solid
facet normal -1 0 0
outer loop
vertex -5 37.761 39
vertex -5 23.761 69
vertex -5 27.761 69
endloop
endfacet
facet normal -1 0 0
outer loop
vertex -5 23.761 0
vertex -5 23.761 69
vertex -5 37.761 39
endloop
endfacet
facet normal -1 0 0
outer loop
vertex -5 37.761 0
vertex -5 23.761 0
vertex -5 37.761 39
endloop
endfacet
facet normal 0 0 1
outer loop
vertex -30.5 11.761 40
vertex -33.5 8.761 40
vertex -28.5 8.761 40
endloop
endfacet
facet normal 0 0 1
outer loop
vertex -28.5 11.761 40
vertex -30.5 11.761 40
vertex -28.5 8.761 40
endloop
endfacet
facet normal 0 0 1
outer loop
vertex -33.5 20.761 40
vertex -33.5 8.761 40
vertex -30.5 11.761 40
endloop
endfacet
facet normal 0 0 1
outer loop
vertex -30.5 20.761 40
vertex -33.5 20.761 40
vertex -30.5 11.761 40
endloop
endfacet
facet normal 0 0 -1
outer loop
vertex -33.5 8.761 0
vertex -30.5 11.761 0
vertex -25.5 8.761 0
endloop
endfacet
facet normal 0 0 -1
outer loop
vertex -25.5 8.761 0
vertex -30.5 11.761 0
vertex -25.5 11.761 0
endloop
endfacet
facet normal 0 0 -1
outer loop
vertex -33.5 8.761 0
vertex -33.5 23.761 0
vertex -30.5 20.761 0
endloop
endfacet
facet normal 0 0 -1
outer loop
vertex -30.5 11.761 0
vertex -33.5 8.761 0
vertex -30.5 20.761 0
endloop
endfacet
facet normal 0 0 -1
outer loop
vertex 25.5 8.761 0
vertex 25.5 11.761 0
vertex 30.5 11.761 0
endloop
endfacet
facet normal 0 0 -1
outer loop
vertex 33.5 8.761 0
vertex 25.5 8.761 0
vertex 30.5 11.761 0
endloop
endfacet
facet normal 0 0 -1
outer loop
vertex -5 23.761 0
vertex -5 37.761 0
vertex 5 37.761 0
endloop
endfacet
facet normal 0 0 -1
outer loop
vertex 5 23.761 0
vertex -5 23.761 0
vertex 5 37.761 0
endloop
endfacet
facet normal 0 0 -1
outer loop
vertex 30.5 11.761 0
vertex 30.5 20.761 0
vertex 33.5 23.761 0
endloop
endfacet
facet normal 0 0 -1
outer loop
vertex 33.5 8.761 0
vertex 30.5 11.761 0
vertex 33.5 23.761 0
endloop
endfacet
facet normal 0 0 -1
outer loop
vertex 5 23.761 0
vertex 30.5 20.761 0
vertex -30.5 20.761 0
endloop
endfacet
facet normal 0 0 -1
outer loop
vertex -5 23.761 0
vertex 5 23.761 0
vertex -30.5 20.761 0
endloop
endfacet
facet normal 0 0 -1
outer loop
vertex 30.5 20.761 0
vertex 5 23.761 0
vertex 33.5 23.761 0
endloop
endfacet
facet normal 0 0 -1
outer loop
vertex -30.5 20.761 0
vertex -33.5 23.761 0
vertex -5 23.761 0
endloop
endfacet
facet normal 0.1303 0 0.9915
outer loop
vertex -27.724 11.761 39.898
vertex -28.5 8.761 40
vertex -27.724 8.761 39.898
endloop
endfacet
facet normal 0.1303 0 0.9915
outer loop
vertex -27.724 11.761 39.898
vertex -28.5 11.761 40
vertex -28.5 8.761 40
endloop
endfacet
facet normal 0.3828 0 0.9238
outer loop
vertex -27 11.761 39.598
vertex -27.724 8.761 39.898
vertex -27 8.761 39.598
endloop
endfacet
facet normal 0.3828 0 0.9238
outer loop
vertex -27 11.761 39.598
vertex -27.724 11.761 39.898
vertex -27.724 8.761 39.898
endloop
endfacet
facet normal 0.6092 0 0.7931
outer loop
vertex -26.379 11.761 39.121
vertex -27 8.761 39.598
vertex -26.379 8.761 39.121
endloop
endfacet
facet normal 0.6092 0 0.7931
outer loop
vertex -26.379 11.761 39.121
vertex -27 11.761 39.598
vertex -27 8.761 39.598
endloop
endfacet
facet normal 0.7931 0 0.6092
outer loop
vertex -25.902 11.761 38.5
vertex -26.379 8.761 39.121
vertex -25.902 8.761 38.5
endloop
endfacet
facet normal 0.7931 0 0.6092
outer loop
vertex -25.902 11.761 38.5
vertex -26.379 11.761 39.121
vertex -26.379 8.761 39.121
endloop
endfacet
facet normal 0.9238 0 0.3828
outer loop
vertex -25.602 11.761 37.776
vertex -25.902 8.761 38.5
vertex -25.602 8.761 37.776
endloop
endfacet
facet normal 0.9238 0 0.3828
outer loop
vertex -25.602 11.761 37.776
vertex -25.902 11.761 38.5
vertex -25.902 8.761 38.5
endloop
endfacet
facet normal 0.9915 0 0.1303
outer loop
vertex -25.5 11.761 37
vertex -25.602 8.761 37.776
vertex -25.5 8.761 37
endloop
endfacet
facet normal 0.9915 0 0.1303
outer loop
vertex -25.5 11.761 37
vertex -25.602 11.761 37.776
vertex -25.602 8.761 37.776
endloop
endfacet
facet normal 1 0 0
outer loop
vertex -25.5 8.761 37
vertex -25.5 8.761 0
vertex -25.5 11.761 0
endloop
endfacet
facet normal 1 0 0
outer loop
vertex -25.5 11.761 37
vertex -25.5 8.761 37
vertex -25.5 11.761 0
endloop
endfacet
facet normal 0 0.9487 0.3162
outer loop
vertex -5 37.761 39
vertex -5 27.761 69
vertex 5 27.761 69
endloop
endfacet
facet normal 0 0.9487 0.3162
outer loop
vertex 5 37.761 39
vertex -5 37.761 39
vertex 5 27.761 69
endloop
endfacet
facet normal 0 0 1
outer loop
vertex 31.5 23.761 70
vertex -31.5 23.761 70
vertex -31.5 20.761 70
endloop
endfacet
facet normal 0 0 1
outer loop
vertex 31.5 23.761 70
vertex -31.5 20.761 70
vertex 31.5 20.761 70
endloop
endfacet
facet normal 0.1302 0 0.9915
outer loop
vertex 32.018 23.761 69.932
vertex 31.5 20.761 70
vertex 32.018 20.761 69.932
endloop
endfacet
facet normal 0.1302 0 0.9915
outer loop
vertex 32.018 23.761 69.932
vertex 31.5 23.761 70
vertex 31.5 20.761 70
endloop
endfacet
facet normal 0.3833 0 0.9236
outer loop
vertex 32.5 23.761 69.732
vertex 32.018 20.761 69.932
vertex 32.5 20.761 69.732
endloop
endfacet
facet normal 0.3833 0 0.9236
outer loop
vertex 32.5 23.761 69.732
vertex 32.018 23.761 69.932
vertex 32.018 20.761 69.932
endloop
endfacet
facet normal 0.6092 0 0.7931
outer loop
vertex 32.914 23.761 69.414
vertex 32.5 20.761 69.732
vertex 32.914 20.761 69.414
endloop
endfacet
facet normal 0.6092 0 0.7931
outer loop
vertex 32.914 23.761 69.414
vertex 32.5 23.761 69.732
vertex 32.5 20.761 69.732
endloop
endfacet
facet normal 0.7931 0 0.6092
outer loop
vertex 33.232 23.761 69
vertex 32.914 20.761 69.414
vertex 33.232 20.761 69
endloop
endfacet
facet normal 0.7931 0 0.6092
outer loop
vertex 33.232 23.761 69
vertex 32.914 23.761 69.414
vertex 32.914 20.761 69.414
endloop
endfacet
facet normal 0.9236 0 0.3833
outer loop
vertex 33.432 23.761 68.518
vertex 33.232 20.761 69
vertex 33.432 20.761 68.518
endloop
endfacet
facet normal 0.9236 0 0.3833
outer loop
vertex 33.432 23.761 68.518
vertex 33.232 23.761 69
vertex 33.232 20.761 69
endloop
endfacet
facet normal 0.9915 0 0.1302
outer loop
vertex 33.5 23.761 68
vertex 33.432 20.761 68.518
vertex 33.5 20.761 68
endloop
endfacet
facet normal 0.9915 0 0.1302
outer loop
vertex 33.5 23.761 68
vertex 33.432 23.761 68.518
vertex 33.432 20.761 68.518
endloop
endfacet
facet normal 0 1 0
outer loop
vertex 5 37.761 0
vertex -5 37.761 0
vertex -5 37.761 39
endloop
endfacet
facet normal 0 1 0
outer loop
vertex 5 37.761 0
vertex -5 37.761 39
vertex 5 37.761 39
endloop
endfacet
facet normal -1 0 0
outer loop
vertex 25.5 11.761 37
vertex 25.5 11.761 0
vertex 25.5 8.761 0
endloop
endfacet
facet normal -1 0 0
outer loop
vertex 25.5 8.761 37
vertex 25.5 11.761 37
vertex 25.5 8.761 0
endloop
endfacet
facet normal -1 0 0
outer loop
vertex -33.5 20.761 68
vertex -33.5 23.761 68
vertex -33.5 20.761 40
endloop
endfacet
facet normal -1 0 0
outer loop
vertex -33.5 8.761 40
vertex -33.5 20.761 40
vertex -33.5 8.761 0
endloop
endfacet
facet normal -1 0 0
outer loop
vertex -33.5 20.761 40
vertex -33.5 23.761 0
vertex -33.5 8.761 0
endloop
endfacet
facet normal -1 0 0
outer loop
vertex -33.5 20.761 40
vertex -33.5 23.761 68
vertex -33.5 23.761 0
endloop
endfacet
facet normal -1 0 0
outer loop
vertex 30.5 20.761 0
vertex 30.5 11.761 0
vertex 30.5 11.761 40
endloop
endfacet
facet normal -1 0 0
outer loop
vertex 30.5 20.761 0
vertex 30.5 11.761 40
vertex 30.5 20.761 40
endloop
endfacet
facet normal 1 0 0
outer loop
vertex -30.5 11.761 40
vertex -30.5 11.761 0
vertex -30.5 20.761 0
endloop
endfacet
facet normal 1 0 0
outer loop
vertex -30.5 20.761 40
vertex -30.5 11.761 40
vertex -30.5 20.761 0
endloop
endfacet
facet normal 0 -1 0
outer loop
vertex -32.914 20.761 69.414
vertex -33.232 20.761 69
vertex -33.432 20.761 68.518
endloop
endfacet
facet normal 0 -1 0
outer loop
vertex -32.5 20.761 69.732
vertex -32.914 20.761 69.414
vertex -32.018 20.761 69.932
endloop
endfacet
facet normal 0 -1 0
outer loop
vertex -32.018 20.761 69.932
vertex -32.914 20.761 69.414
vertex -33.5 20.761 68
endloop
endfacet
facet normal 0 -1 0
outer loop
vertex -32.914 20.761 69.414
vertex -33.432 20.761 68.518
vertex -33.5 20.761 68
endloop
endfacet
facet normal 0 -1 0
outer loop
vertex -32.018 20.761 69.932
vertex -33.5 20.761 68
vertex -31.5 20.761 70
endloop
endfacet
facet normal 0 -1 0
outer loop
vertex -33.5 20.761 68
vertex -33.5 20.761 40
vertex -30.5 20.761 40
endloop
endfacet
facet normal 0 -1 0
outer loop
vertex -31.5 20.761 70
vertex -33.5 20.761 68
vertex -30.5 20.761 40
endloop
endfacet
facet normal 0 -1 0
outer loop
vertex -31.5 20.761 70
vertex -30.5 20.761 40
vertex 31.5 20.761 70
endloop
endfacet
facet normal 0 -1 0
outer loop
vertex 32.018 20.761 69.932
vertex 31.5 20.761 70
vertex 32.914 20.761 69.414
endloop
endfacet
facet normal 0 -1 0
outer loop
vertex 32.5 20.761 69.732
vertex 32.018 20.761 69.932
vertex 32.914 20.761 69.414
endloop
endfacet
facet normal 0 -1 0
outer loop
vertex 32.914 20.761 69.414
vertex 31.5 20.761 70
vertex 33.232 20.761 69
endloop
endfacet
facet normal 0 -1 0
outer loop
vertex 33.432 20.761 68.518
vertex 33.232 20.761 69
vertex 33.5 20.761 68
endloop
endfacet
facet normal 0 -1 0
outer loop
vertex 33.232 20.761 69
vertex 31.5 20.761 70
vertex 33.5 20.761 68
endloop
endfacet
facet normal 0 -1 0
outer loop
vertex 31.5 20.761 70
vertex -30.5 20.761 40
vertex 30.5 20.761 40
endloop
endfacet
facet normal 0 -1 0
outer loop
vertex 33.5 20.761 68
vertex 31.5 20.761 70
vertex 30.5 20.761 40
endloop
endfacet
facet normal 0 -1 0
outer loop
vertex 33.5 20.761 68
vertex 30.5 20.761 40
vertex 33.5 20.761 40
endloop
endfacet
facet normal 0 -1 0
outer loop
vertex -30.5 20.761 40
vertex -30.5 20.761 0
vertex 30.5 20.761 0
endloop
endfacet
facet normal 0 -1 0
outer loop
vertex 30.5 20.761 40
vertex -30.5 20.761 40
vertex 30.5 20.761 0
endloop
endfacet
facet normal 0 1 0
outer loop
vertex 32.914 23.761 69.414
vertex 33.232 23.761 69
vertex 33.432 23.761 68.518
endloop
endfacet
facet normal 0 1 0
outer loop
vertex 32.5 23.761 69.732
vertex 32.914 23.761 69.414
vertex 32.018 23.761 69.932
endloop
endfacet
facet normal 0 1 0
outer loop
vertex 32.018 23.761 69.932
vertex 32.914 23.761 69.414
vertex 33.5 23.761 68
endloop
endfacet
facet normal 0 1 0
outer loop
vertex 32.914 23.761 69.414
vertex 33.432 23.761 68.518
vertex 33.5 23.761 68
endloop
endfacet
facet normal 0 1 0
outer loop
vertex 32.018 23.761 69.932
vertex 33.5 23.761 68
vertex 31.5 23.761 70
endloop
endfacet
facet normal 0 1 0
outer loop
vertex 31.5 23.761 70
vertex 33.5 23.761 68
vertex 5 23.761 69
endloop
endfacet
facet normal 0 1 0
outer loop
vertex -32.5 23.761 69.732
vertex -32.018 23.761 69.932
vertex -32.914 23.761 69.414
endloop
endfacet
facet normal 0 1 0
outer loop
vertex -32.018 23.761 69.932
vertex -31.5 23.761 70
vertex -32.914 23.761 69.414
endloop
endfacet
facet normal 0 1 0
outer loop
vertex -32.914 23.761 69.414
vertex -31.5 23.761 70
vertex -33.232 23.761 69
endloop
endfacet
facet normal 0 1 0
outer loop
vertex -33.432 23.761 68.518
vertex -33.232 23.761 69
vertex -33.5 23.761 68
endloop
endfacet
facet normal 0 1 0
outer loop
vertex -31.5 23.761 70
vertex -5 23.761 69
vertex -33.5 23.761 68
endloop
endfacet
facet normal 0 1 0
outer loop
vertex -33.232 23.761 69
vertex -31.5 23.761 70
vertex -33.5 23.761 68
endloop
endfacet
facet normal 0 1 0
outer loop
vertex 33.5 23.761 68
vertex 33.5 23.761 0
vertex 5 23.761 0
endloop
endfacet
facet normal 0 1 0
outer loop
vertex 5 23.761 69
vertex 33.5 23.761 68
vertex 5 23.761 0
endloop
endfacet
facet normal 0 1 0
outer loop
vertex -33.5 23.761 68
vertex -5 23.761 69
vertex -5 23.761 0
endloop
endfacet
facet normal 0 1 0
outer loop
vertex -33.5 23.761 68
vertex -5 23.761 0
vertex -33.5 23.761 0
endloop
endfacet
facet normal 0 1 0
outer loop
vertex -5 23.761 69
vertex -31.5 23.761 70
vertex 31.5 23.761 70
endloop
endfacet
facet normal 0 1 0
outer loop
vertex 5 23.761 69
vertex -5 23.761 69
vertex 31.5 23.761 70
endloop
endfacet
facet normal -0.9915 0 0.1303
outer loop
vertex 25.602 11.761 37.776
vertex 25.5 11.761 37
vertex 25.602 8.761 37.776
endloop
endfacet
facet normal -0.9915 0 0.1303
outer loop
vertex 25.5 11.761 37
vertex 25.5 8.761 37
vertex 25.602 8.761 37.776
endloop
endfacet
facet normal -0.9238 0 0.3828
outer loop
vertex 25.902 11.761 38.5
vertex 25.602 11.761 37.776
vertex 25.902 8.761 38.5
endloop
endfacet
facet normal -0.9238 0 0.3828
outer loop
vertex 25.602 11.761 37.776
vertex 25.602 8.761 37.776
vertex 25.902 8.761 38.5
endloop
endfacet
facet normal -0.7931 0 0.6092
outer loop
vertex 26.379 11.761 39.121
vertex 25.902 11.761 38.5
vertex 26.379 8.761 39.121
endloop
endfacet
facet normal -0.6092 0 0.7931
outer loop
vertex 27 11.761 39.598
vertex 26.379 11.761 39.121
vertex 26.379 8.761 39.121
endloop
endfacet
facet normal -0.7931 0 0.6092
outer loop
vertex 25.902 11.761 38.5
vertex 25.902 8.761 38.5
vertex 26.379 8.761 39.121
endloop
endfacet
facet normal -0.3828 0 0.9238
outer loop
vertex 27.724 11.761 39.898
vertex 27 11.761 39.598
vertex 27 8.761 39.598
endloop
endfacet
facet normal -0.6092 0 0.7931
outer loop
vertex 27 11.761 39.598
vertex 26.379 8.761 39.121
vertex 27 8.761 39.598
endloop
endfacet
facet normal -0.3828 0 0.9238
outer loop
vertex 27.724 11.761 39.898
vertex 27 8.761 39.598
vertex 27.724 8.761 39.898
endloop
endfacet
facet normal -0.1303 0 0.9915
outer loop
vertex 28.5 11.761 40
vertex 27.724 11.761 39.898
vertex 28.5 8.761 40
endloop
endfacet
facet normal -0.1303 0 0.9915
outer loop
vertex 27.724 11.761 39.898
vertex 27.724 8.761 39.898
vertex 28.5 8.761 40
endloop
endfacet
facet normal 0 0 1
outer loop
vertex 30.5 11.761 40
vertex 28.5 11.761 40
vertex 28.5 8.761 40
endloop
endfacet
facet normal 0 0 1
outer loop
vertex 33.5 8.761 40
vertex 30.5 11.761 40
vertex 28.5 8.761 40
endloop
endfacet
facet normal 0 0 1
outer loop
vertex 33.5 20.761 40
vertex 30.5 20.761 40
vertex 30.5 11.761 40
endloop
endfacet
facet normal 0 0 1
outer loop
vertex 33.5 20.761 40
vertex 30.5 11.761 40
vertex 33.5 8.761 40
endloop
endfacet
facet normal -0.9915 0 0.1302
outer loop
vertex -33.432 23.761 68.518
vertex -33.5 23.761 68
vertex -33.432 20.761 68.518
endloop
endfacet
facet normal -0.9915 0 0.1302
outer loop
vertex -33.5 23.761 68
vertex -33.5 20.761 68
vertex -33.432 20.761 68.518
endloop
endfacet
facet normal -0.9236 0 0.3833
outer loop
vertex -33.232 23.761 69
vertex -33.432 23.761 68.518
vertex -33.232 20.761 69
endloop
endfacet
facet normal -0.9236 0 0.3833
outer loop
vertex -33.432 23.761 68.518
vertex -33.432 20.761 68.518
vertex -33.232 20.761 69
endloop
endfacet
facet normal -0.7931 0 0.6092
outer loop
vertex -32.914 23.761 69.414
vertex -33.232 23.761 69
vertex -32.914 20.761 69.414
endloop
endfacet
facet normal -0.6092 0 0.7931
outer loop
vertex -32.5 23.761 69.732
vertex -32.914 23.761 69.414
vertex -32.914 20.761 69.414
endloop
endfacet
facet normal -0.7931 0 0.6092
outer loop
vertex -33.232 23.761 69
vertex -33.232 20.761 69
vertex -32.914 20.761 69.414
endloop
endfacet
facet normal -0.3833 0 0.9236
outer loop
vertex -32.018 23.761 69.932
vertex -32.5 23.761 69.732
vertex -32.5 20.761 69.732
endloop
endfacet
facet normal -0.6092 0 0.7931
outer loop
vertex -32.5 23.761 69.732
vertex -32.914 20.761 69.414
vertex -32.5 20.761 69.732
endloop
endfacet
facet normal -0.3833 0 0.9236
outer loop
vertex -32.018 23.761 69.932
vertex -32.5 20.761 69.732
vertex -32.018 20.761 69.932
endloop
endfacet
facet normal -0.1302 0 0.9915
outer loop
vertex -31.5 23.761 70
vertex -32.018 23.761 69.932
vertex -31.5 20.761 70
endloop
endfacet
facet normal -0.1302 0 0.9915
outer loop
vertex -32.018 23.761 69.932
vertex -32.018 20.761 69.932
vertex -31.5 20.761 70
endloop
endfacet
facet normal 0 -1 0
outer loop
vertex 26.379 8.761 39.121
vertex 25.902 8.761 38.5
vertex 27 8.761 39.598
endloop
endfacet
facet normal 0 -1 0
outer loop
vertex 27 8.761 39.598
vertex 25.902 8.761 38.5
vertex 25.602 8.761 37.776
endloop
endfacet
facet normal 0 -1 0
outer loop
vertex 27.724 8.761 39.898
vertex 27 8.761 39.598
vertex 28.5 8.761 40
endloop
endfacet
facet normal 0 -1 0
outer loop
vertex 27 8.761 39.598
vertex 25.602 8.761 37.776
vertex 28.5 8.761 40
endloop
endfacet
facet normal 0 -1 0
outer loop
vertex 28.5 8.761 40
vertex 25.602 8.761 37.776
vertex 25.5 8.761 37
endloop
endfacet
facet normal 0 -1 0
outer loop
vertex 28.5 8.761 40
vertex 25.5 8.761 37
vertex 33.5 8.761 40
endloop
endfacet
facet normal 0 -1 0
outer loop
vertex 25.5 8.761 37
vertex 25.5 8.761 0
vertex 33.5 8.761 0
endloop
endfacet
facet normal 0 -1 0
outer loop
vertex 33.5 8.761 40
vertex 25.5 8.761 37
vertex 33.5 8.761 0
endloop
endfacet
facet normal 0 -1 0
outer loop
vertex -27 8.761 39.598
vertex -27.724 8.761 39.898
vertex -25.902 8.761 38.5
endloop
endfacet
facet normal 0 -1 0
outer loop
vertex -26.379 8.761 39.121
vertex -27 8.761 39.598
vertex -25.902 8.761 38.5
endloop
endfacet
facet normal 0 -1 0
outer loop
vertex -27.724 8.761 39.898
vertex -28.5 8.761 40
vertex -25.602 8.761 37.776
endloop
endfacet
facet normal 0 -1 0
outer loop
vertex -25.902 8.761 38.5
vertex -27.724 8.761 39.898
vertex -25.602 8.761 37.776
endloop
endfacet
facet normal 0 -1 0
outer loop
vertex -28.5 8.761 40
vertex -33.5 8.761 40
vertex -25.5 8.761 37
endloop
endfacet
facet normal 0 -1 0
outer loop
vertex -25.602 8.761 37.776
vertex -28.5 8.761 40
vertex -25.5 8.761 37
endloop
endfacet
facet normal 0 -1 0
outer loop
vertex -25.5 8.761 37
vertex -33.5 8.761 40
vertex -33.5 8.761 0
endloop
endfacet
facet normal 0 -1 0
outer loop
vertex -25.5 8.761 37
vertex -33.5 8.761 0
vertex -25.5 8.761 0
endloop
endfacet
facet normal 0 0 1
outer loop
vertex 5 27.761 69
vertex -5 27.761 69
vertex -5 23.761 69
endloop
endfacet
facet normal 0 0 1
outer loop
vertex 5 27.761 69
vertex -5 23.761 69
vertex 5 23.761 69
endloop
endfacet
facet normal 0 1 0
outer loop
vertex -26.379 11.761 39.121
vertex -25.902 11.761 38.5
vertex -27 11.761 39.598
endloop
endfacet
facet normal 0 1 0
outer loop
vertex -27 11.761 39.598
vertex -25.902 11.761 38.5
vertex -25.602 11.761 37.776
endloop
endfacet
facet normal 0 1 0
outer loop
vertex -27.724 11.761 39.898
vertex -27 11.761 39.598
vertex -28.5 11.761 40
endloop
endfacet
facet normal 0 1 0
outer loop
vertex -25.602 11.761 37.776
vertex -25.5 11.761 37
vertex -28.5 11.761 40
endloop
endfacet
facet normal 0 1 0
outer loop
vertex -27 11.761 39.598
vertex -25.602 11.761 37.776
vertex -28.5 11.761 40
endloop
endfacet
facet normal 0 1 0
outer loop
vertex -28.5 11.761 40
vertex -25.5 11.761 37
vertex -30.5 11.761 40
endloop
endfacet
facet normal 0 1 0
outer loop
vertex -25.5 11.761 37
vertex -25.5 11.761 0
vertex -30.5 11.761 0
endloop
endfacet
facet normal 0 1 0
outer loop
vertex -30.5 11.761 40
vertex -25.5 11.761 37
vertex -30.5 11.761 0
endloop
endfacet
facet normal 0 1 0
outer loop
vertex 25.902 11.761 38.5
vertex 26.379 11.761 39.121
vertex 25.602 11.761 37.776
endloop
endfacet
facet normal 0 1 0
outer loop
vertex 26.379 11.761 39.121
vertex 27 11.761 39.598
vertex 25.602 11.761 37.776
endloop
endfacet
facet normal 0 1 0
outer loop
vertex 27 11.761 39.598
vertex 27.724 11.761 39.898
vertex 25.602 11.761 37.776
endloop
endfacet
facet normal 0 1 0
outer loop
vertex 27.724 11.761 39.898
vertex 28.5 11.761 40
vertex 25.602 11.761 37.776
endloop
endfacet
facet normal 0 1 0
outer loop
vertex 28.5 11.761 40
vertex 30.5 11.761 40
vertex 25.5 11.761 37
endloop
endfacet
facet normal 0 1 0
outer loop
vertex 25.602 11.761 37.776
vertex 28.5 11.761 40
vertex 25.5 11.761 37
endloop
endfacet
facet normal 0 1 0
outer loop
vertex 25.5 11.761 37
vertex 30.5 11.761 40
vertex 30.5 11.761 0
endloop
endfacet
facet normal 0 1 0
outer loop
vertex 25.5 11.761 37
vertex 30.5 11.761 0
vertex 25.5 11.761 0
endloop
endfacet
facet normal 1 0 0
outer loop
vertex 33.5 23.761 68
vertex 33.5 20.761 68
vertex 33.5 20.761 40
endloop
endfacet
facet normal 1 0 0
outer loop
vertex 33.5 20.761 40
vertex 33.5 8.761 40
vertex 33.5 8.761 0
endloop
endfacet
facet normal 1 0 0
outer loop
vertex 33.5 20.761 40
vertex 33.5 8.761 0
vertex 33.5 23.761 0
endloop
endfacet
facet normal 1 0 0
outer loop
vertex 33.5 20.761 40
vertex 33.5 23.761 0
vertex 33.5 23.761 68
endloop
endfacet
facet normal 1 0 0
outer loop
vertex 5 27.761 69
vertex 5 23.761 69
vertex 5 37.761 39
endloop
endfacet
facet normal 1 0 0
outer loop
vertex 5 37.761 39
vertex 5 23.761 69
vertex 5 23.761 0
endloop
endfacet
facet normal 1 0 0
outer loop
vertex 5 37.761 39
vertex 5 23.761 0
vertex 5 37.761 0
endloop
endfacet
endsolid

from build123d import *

# Parameters (mm, degrees)
F0_W     = 10
F0_H     = 1
F1_DEPTH = 70
F0_W_2   = 3
F0_H_2   = 9
F2_DEPTH = 40
F3_R     = 2
F4_R     = 3
F0_H_3   = 14
F5_DEPTH = 69
F6_SIZE2 = 10
F6_SIZE  = 30


with BuildPart() as f1:
    # F0 (on Top) → F1 (new body)
    with BuildSketch(Plane.XY):
        Polygon((33.5, 20.7614854574), (33.5, 23.7614854574), (32.5, 23.7614854574), (5, 23.7614854574), (5, 22.7614854574), (-5, 22.7614854574), (-5, 23.7614854574), (-33.5, 23.7614854574), (-33.5, 20.7614854574), (-30.5, 20.7614854574), (30.5, 20.7614854574), align=None)
        with Locations((0, 23.2614854574)):
            Rectangle(F0_W, F0_H)
    extrude(amount=F1_DEPTH)

    # F0 (on Top) → F2 (join)
    with BuildSketch(Plane.XY):
        Polygon((-25.5, 11.7614854574), (-30.5, 11.7614854574), (-33.5, 11.7614854574), (-33.5, 8.7614854574), (-25.5, 8.7614854574), align=None)
        with Locations((-32, 16.2614854574)):
            Rectangle(F0_W_2, F0_H_2)
        Polygon((33.5, 8.7614854574), (33.5, 11.7614854574), (30.5, 11.7614854574), (25.5, 11.7614854574), (25.5, 8.7614854574), align=None)
        with Locations((32, 16.2614854574)):
            Rectangle(F0_W_2, F0_H_2)
    extrude(amount=F2_DEPTH)

    # F3
    f3_edges = [f1.edges().sort_by_distance(p)[0] for p in [
        (33.5, 22.261485, 70),
        (-33.5, 22.261485, 70),
    ]]
    fillet(f3_edges, radius=F3_R)

    # F4
    f4_edges = [f1.edges().sort_by_distance(p)[0] for p in [
        (25.5, 10.261485, 40),
        (-25.5, 10.261485, 40),
    ]]
    fillet(f4_edges, radius=F4_R)

    # F0 (on Top) → F5 (join)
    with BuildSketch(Plane.XY):
        with Locations((0, 30.7614854574)):
            Rectangle(F0_W, F0_H_3)
    extrude(amount=F5_DEPTH)

    # F6
    f6_edges = [f1.edges().sort_by_distance(p)[0] for p in [
        (0, 37.761485, 69),
    ]]
    f6_side = f1.faces().sort_by_distance((0, 37.761485, 34.5))[0]
    chamfer(f6_edges, length=F6_SIZE, length2=F6_SIZE2, reference=f6_side)


solid = f1.part
